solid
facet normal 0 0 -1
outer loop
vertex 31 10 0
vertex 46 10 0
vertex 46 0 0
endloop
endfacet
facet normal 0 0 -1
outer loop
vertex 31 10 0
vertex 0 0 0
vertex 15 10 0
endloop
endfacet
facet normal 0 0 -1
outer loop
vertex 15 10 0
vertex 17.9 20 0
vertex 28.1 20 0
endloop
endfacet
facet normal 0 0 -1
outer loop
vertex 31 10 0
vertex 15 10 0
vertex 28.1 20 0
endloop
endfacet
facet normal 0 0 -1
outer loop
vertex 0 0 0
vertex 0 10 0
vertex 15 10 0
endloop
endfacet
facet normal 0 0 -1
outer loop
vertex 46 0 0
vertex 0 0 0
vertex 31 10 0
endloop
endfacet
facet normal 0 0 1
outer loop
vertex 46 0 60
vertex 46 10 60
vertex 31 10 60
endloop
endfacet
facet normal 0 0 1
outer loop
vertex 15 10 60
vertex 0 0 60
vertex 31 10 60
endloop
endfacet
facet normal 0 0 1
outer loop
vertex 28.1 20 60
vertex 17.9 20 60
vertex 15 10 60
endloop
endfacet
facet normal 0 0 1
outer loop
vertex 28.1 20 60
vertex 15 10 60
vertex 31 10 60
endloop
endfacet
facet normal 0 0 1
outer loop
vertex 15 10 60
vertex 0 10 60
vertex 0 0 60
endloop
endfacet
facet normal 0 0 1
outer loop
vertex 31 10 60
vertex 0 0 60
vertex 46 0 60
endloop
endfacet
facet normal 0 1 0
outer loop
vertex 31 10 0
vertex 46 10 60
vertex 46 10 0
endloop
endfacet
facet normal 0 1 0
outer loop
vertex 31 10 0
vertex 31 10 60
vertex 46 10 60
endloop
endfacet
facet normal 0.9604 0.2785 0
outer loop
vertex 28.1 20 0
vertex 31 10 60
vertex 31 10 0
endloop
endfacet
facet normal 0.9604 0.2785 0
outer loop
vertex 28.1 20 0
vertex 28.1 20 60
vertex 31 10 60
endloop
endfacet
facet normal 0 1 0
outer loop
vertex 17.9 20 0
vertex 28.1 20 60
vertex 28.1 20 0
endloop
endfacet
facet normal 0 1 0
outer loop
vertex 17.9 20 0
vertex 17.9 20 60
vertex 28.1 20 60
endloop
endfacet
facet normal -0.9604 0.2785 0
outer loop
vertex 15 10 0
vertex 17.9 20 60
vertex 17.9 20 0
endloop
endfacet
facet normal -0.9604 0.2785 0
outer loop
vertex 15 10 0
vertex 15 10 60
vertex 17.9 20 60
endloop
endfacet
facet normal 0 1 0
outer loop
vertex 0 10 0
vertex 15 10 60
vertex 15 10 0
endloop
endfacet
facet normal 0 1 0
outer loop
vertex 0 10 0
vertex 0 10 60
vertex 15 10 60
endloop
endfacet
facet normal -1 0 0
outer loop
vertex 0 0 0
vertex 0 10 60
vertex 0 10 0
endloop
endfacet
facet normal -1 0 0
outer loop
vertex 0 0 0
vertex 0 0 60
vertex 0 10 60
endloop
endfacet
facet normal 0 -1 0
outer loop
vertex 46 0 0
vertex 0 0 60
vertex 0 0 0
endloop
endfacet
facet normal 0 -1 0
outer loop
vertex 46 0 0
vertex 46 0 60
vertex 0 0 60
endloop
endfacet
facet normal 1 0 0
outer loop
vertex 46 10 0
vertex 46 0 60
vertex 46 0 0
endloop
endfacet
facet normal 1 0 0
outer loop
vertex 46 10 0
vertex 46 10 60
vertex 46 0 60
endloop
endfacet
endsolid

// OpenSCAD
$fn = 32;

// ----------------------------------------------------------------------
// V guide rail: dovetail, 46 mm wide
// ----------------------------------------------------------------------

// --- parameters (mm) ---
rail_w = 46;              // rail width, X
base_t = 10;              // base plate thickness
v_depth = 10;             // V feature depth / height
v_half_w = 8;             // half width of the V at the base face
plate_t = 60;             // rail length, Z (the extrusion height)
top_half_w = 5.1;         // half width at the dovetail top

dovetail_base = 2 * v_half_w;  // dovetail width at the base
dovetail_top = 2 * top_half_w;  // dovetail width at the top

profile = [[0, 0], [46, 0], [46, 10], [31, 10], [28.1, 20], [17.9, 20], [15, 10], [0, 10]];  // primary outline, 8 points, counter clockwise

// --- the one profile operation ---
linear_extrude(height = plate_t) polygon(points = profile);
